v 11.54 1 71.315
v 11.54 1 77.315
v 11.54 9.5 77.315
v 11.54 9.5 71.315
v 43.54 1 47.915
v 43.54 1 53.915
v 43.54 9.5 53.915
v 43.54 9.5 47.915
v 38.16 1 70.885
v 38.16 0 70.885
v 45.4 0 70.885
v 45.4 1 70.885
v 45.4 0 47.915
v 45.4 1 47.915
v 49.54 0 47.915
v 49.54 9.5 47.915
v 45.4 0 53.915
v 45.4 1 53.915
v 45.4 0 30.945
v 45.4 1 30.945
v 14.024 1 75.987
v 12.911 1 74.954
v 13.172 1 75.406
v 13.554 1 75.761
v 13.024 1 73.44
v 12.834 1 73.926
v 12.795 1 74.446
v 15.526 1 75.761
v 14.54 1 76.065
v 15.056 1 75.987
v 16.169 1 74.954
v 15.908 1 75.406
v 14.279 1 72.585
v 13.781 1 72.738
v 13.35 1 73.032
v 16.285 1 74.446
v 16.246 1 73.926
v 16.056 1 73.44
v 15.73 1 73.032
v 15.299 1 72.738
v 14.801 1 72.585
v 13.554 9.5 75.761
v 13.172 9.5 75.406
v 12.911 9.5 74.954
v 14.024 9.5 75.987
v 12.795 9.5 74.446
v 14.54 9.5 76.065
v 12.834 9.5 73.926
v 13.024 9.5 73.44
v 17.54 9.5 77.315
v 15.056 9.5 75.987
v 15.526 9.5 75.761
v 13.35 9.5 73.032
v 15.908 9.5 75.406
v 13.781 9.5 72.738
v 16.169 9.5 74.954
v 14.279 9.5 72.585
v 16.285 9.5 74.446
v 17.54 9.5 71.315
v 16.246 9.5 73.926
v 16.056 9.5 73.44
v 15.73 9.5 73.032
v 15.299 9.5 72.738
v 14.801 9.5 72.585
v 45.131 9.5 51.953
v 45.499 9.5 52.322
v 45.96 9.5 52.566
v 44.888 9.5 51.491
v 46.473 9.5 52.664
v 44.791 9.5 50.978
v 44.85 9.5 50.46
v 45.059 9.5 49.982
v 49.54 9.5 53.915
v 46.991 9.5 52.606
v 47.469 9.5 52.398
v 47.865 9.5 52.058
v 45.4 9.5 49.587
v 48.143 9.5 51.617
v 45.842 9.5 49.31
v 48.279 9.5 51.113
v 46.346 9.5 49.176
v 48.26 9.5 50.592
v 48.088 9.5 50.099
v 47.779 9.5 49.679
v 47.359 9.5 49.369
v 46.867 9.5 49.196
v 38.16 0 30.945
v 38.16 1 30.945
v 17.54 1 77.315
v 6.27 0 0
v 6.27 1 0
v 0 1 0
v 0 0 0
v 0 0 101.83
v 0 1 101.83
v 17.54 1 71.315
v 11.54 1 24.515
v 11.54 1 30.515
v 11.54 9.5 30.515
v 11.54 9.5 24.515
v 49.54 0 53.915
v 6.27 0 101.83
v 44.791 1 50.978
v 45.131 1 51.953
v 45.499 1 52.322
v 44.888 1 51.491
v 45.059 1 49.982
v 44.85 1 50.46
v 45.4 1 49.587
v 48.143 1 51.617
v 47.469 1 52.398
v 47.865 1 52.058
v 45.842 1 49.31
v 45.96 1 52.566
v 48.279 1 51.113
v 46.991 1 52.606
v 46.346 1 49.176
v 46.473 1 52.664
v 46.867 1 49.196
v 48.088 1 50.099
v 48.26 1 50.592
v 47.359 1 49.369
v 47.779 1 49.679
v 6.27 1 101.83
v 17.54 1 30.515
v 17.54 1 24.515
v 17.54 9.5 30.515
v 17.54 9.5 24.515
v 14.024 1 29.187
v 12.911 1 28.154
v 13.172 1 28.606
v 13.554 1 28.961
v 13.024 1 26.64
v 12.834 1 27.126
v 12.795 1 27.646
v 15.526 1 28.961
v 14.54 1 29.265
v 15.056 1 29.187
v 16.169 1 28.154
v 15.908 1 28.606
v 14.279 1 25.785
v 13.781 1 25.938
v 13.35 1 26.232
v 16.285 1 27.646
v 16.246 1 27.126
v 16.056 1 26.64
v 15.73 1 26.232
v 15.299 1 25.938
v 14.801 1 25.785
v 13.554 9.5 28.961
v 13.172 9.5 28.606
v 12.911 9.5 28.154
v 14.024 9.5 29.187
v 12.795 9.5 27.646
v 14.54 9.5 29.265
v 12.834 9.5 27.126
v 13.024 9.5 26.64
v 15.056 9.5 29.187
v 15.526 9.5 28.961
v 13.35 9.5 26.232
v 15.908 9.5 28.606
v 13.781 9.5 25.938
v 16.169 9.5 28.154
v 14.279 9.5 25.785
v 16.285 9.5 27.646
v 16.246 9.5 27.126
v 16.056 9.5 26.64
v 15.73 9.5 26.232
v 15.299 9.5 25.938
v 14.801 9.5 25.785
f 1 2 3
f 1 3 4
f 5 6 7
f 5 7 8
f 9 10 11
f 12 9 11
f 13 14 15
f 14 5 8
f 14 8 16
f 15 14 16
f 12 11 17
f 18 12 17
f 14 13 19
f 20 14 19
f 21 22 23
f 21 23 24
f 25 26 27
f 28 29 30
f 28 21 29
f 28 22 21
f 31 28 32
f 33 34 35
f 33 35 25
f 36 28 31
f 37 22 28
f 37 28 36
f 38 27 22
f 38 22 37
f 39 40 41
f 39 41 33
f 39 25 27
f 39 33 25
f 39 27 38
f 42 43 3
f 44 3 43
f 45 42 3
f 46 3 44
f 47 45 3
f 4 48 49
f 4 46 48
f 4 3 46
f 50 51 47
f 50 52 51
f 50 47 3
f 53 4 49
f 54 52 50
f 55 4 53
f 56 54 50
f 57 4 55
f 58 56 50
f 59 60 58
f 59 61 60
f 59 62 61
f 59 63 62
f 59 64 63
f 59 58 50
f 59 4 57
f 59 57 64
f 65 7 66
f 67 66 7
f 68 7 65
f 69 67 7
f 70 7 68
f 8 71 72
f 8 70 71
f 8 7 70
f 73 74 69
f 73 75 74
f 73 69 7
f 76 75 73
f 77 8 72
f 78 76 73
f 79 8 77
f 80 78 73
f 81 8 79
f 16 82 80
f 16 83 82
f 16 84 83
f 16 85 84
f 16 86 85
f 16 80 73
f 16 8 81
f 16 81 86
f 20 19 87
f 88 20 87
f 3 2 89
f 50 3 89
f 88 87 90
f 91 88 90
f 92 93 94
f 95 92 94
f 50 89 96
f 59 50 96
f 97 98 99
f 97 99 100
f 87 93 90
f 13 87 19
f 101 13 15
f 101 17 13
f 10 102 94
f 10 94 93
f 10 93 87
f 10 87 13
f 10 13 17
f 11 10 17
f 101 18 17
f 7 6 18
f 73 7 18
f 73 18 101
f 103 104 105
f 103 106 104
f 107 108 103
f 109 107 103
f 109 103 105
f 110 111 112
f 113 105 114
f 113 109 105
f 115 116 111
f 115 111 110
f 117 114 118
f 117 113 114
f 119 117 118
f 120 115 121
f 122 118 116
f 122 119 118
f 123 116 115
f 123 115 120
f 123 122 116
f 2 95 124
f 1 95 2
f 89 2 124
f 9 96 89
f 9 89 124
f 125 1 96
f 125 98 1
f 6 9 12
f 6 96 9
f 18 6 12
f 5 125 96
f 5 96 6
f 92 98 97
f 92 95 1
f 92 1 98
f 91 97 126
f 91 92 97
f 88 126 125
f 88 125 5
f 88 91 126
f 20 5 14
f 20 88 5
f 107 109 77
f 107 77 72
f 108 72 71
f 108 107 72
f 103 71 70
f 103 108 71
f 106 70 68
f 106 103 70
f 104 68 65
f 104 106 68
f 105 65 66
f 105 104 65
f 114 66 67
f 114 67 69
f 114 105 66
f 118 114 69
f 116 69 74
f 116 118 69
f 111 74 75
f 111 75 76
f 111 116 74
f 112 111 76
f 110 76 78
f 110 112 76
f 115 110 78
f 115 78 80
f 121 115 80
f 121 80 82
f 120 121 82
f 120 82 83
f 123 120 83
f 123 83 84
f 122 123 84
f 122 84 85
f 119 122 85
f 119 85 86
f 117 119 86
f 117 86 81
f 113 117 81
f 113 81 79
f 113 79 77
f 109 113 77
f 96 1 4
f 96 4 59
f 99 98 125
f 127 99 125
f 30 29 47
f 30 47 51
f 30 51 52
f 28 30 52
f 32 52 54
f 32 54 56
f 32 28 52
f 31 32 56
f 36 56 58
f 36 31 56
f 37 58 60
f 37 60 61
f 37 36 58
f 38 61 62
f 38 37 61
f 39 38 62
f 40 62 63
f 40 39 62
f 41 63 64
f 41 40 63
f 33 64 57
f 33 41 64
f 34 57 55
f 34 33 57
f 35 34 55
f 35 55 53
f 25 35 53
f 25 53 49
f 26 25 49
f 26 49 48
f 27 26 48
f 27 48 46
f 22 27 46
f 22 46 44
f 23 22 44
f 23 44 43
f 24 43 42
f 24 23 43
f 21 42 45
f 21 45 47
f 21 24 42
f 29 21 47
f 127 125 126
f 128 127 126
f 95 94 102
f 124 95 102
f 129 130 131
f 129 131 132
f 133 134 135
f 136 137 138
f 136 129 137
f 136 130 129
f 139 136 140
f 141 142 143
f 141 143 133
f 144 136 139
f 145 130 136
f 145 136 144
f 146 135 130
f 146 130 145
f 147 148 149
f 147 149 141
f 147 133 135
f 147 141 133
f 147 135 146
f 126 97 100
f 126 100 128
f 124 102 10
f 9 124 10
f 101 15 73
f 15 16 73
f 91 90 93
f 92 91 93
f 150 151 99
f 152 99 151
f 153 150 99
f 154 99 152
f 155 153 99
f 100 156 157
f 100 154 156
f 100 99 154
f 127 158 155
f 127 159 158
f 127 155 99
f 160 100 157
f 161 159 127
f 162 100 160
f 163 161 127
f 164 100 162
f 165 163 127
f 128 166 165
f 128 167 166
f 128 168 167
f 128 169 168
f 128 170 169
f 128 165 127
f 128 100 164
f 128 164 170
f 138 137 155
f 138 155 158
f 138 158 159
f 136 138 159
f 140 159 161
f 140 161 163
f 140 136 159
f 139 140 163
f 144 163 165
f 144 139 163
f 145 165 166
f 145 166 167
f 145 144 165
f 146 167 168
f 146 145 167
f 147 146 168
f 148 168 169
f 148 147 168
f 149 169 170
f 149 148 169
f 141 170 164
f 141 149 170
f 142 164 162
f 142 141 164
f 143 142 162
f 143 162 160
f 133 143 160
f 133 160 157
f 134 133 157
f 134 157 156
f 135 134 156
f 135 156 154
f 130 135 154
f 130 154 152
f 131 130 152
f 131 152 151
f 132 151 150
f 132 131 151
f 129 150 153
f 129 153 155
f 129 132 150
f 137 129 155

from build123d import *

# Parameters (mm, degrees)
SALIENTE_EXTRUIR1_DEPTH = 1
CROQUIS2_W              = 6
CROQUIS2_H              = 6
CROQUIS2_R              = 1.75
SALIENTE_EXTRUIR2_DEPTH = 8.5
CROQUIS3_W              = 4.14
CROQUIS3_H              = 6
SALIENTE_EXTRUIR3_DEPTH = 1


with BuildPart() as part:
    # Croquis1 → Saliente-Extruir1 (new body)
    with BuildSketch(Plane(origin=(0, 0, 0), x_dir=(1, 0, 0), z_dir=(0, 1, 0))):
        Polygon((0, 0), (0, -101.83), (6.27, -101.83), (38.16, -70.885), (45.4, -70.885), (45.4, -30.945), (38.16, -30.945), (6.27, 0), align=None)
    extrude(amount=SALIENTE_EXTRUIR1_DEPTH)

    # Croquis2 → Saliente-Extruir2 (add)
    # profile 1 of 3: a face of its own
    with BuildSketch(Plane(origin=(0, 1, 0), x_dir=(1, 0, 0), z_dir=(0, 1, 0))):
        with Locations((14.54, -27.515)):
            Rectangle(CROQUIS2_W, CROQUIS2_H)
        with Locations(Location((14.54, -27.515, 0), (0, 0, 270))):
            Circle(CROQUIS2_R, mode=Mode.SUBTRACT)
    # profile 2 of 3: a face of its own
    with BuildSketch(Plane(origin=(0, 1, 0), x_dir=(1, 0, 0), z_dir=(0, 1, 0))):
        with Locations((14.54, -74.315)):
            Rectangle(CROQUIS2_W, CROQUIS2_H)
        with Locations(Location((14.54, -74.315, 0), (0, 0, 270))):
            Circle(CROQUIS2_R, mode=Mode.SUBTRACT)
    # profile 3 of 3: a face of its own
    with BuildSketch(Plane(origin=(0, 1, 0), x_dir=(1, 0, 0), z_dir=(0, 1, 0))):
        with Locations((46.54, -50.915)):
            Rectangle(CROQUIS2_W, CROQUIS2_H)
        with Locations(Location((46.54, -50.915, 0), (0, 0, 130.649396827))):
            Circle(CROQUIS2_R, mode=Mode.SUBTRACT)
    extrude(amount=SALIENTE_EXTRUIR2_DEPTH)

    # Croquis3 → Saliente-Extruir3 (add)
    with BuildSketch(Plane.XZ.offset(-1)):
        with Locations((47.47, 50.915)):
            Rectangle(CROQUIS3_W, CROQUIS3_H)
    extrude(amount=SALIENTE_EXTRUIR3_DEPTH)


solid = part.part
